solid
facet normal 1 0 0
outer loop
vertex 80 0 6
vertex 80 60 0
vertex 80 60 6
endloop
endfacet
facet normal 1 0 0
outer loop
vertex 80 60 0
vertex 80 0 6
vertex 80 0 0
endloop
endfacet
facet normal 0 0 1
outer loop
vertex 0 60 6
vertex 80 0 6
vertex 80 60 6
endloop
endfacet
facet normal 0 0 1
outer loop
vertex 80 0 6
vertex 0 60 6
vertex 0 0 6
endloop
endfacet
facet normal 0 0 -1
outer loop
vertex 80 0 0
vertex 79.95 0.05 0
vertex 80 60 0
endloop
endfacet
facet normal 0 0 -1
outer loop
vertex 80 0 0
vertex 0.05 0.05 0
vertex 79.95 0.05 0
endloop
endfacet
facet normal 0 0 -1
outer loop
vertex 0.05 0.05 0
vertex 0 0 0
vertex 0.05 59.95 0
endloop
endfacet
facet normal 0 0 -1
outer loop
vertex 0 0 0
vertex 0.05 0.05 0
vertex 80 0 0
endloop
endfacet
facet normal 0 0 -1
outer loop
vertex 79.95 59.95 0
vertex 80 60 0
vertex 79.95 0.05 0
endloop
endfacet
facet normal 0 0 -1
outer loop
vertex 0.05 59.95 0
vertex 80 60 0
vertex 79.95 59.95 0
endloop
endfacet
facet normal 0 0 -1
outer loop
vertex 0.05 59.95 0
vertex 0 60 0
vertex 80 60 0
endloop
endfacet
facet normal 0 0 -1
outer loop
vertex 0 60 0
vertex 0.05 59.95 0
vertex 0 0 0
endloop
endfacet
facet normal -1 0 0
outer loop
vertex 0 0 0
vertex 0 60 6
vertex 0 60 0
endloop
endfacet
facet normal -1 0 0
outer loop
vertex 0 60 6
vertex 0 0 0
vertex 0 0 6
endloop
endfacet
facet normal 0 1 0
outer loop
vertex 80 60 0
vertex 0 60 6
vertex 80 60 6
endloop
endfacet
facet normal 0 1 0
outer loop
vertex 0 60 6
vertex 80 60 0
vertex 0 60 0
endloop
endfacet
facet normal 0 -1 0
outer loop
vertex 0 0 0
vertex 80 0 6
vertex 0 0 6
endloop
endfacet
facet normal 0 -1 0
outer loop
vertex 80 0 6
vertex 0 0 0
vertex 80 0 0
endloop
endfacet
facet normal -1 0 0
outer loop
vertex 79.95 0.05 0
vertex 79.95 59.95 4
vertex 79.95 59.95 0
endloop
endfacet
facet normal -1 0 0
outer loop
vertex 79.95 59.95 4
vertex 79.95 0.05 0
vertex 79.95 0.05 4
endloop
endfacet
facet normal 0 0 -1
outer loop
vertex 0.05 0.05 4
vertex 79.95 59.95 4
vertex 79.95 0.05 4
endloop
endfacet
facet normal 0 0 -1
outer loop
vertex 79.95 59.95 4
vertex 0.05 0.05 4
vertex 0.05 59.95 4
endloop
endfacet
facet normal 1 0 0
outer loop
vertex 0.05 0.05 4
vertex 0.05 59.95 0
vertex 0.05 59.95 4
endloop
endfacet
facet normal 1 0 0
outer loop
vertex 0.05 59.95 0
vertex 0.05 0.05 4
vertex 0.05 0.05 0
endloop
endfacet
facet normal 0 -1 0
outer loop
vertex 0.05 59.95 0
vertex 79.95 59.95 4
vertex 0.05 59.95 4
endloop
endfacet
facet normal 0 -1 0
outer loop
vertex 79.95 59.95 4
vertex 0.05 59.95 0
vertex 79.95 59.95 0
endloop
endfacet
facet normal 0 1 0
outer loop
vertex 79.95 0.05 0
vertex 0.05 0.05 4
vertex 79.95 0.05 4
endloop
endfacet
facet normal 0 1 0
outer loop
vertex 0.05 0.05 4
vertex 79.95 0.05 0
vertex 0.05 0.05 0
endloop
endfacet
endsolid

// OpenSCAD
$fn=48;
translate([0,0,0])
{
difference()
{
    cube(size = [80.00, 60.00, 6.00], center = false); 
    translate(v = [0.05, 0.05, 0.00])
    {
        cube(size = [79.90, 59.90, 4.00], center = false); 
    }
}

}
